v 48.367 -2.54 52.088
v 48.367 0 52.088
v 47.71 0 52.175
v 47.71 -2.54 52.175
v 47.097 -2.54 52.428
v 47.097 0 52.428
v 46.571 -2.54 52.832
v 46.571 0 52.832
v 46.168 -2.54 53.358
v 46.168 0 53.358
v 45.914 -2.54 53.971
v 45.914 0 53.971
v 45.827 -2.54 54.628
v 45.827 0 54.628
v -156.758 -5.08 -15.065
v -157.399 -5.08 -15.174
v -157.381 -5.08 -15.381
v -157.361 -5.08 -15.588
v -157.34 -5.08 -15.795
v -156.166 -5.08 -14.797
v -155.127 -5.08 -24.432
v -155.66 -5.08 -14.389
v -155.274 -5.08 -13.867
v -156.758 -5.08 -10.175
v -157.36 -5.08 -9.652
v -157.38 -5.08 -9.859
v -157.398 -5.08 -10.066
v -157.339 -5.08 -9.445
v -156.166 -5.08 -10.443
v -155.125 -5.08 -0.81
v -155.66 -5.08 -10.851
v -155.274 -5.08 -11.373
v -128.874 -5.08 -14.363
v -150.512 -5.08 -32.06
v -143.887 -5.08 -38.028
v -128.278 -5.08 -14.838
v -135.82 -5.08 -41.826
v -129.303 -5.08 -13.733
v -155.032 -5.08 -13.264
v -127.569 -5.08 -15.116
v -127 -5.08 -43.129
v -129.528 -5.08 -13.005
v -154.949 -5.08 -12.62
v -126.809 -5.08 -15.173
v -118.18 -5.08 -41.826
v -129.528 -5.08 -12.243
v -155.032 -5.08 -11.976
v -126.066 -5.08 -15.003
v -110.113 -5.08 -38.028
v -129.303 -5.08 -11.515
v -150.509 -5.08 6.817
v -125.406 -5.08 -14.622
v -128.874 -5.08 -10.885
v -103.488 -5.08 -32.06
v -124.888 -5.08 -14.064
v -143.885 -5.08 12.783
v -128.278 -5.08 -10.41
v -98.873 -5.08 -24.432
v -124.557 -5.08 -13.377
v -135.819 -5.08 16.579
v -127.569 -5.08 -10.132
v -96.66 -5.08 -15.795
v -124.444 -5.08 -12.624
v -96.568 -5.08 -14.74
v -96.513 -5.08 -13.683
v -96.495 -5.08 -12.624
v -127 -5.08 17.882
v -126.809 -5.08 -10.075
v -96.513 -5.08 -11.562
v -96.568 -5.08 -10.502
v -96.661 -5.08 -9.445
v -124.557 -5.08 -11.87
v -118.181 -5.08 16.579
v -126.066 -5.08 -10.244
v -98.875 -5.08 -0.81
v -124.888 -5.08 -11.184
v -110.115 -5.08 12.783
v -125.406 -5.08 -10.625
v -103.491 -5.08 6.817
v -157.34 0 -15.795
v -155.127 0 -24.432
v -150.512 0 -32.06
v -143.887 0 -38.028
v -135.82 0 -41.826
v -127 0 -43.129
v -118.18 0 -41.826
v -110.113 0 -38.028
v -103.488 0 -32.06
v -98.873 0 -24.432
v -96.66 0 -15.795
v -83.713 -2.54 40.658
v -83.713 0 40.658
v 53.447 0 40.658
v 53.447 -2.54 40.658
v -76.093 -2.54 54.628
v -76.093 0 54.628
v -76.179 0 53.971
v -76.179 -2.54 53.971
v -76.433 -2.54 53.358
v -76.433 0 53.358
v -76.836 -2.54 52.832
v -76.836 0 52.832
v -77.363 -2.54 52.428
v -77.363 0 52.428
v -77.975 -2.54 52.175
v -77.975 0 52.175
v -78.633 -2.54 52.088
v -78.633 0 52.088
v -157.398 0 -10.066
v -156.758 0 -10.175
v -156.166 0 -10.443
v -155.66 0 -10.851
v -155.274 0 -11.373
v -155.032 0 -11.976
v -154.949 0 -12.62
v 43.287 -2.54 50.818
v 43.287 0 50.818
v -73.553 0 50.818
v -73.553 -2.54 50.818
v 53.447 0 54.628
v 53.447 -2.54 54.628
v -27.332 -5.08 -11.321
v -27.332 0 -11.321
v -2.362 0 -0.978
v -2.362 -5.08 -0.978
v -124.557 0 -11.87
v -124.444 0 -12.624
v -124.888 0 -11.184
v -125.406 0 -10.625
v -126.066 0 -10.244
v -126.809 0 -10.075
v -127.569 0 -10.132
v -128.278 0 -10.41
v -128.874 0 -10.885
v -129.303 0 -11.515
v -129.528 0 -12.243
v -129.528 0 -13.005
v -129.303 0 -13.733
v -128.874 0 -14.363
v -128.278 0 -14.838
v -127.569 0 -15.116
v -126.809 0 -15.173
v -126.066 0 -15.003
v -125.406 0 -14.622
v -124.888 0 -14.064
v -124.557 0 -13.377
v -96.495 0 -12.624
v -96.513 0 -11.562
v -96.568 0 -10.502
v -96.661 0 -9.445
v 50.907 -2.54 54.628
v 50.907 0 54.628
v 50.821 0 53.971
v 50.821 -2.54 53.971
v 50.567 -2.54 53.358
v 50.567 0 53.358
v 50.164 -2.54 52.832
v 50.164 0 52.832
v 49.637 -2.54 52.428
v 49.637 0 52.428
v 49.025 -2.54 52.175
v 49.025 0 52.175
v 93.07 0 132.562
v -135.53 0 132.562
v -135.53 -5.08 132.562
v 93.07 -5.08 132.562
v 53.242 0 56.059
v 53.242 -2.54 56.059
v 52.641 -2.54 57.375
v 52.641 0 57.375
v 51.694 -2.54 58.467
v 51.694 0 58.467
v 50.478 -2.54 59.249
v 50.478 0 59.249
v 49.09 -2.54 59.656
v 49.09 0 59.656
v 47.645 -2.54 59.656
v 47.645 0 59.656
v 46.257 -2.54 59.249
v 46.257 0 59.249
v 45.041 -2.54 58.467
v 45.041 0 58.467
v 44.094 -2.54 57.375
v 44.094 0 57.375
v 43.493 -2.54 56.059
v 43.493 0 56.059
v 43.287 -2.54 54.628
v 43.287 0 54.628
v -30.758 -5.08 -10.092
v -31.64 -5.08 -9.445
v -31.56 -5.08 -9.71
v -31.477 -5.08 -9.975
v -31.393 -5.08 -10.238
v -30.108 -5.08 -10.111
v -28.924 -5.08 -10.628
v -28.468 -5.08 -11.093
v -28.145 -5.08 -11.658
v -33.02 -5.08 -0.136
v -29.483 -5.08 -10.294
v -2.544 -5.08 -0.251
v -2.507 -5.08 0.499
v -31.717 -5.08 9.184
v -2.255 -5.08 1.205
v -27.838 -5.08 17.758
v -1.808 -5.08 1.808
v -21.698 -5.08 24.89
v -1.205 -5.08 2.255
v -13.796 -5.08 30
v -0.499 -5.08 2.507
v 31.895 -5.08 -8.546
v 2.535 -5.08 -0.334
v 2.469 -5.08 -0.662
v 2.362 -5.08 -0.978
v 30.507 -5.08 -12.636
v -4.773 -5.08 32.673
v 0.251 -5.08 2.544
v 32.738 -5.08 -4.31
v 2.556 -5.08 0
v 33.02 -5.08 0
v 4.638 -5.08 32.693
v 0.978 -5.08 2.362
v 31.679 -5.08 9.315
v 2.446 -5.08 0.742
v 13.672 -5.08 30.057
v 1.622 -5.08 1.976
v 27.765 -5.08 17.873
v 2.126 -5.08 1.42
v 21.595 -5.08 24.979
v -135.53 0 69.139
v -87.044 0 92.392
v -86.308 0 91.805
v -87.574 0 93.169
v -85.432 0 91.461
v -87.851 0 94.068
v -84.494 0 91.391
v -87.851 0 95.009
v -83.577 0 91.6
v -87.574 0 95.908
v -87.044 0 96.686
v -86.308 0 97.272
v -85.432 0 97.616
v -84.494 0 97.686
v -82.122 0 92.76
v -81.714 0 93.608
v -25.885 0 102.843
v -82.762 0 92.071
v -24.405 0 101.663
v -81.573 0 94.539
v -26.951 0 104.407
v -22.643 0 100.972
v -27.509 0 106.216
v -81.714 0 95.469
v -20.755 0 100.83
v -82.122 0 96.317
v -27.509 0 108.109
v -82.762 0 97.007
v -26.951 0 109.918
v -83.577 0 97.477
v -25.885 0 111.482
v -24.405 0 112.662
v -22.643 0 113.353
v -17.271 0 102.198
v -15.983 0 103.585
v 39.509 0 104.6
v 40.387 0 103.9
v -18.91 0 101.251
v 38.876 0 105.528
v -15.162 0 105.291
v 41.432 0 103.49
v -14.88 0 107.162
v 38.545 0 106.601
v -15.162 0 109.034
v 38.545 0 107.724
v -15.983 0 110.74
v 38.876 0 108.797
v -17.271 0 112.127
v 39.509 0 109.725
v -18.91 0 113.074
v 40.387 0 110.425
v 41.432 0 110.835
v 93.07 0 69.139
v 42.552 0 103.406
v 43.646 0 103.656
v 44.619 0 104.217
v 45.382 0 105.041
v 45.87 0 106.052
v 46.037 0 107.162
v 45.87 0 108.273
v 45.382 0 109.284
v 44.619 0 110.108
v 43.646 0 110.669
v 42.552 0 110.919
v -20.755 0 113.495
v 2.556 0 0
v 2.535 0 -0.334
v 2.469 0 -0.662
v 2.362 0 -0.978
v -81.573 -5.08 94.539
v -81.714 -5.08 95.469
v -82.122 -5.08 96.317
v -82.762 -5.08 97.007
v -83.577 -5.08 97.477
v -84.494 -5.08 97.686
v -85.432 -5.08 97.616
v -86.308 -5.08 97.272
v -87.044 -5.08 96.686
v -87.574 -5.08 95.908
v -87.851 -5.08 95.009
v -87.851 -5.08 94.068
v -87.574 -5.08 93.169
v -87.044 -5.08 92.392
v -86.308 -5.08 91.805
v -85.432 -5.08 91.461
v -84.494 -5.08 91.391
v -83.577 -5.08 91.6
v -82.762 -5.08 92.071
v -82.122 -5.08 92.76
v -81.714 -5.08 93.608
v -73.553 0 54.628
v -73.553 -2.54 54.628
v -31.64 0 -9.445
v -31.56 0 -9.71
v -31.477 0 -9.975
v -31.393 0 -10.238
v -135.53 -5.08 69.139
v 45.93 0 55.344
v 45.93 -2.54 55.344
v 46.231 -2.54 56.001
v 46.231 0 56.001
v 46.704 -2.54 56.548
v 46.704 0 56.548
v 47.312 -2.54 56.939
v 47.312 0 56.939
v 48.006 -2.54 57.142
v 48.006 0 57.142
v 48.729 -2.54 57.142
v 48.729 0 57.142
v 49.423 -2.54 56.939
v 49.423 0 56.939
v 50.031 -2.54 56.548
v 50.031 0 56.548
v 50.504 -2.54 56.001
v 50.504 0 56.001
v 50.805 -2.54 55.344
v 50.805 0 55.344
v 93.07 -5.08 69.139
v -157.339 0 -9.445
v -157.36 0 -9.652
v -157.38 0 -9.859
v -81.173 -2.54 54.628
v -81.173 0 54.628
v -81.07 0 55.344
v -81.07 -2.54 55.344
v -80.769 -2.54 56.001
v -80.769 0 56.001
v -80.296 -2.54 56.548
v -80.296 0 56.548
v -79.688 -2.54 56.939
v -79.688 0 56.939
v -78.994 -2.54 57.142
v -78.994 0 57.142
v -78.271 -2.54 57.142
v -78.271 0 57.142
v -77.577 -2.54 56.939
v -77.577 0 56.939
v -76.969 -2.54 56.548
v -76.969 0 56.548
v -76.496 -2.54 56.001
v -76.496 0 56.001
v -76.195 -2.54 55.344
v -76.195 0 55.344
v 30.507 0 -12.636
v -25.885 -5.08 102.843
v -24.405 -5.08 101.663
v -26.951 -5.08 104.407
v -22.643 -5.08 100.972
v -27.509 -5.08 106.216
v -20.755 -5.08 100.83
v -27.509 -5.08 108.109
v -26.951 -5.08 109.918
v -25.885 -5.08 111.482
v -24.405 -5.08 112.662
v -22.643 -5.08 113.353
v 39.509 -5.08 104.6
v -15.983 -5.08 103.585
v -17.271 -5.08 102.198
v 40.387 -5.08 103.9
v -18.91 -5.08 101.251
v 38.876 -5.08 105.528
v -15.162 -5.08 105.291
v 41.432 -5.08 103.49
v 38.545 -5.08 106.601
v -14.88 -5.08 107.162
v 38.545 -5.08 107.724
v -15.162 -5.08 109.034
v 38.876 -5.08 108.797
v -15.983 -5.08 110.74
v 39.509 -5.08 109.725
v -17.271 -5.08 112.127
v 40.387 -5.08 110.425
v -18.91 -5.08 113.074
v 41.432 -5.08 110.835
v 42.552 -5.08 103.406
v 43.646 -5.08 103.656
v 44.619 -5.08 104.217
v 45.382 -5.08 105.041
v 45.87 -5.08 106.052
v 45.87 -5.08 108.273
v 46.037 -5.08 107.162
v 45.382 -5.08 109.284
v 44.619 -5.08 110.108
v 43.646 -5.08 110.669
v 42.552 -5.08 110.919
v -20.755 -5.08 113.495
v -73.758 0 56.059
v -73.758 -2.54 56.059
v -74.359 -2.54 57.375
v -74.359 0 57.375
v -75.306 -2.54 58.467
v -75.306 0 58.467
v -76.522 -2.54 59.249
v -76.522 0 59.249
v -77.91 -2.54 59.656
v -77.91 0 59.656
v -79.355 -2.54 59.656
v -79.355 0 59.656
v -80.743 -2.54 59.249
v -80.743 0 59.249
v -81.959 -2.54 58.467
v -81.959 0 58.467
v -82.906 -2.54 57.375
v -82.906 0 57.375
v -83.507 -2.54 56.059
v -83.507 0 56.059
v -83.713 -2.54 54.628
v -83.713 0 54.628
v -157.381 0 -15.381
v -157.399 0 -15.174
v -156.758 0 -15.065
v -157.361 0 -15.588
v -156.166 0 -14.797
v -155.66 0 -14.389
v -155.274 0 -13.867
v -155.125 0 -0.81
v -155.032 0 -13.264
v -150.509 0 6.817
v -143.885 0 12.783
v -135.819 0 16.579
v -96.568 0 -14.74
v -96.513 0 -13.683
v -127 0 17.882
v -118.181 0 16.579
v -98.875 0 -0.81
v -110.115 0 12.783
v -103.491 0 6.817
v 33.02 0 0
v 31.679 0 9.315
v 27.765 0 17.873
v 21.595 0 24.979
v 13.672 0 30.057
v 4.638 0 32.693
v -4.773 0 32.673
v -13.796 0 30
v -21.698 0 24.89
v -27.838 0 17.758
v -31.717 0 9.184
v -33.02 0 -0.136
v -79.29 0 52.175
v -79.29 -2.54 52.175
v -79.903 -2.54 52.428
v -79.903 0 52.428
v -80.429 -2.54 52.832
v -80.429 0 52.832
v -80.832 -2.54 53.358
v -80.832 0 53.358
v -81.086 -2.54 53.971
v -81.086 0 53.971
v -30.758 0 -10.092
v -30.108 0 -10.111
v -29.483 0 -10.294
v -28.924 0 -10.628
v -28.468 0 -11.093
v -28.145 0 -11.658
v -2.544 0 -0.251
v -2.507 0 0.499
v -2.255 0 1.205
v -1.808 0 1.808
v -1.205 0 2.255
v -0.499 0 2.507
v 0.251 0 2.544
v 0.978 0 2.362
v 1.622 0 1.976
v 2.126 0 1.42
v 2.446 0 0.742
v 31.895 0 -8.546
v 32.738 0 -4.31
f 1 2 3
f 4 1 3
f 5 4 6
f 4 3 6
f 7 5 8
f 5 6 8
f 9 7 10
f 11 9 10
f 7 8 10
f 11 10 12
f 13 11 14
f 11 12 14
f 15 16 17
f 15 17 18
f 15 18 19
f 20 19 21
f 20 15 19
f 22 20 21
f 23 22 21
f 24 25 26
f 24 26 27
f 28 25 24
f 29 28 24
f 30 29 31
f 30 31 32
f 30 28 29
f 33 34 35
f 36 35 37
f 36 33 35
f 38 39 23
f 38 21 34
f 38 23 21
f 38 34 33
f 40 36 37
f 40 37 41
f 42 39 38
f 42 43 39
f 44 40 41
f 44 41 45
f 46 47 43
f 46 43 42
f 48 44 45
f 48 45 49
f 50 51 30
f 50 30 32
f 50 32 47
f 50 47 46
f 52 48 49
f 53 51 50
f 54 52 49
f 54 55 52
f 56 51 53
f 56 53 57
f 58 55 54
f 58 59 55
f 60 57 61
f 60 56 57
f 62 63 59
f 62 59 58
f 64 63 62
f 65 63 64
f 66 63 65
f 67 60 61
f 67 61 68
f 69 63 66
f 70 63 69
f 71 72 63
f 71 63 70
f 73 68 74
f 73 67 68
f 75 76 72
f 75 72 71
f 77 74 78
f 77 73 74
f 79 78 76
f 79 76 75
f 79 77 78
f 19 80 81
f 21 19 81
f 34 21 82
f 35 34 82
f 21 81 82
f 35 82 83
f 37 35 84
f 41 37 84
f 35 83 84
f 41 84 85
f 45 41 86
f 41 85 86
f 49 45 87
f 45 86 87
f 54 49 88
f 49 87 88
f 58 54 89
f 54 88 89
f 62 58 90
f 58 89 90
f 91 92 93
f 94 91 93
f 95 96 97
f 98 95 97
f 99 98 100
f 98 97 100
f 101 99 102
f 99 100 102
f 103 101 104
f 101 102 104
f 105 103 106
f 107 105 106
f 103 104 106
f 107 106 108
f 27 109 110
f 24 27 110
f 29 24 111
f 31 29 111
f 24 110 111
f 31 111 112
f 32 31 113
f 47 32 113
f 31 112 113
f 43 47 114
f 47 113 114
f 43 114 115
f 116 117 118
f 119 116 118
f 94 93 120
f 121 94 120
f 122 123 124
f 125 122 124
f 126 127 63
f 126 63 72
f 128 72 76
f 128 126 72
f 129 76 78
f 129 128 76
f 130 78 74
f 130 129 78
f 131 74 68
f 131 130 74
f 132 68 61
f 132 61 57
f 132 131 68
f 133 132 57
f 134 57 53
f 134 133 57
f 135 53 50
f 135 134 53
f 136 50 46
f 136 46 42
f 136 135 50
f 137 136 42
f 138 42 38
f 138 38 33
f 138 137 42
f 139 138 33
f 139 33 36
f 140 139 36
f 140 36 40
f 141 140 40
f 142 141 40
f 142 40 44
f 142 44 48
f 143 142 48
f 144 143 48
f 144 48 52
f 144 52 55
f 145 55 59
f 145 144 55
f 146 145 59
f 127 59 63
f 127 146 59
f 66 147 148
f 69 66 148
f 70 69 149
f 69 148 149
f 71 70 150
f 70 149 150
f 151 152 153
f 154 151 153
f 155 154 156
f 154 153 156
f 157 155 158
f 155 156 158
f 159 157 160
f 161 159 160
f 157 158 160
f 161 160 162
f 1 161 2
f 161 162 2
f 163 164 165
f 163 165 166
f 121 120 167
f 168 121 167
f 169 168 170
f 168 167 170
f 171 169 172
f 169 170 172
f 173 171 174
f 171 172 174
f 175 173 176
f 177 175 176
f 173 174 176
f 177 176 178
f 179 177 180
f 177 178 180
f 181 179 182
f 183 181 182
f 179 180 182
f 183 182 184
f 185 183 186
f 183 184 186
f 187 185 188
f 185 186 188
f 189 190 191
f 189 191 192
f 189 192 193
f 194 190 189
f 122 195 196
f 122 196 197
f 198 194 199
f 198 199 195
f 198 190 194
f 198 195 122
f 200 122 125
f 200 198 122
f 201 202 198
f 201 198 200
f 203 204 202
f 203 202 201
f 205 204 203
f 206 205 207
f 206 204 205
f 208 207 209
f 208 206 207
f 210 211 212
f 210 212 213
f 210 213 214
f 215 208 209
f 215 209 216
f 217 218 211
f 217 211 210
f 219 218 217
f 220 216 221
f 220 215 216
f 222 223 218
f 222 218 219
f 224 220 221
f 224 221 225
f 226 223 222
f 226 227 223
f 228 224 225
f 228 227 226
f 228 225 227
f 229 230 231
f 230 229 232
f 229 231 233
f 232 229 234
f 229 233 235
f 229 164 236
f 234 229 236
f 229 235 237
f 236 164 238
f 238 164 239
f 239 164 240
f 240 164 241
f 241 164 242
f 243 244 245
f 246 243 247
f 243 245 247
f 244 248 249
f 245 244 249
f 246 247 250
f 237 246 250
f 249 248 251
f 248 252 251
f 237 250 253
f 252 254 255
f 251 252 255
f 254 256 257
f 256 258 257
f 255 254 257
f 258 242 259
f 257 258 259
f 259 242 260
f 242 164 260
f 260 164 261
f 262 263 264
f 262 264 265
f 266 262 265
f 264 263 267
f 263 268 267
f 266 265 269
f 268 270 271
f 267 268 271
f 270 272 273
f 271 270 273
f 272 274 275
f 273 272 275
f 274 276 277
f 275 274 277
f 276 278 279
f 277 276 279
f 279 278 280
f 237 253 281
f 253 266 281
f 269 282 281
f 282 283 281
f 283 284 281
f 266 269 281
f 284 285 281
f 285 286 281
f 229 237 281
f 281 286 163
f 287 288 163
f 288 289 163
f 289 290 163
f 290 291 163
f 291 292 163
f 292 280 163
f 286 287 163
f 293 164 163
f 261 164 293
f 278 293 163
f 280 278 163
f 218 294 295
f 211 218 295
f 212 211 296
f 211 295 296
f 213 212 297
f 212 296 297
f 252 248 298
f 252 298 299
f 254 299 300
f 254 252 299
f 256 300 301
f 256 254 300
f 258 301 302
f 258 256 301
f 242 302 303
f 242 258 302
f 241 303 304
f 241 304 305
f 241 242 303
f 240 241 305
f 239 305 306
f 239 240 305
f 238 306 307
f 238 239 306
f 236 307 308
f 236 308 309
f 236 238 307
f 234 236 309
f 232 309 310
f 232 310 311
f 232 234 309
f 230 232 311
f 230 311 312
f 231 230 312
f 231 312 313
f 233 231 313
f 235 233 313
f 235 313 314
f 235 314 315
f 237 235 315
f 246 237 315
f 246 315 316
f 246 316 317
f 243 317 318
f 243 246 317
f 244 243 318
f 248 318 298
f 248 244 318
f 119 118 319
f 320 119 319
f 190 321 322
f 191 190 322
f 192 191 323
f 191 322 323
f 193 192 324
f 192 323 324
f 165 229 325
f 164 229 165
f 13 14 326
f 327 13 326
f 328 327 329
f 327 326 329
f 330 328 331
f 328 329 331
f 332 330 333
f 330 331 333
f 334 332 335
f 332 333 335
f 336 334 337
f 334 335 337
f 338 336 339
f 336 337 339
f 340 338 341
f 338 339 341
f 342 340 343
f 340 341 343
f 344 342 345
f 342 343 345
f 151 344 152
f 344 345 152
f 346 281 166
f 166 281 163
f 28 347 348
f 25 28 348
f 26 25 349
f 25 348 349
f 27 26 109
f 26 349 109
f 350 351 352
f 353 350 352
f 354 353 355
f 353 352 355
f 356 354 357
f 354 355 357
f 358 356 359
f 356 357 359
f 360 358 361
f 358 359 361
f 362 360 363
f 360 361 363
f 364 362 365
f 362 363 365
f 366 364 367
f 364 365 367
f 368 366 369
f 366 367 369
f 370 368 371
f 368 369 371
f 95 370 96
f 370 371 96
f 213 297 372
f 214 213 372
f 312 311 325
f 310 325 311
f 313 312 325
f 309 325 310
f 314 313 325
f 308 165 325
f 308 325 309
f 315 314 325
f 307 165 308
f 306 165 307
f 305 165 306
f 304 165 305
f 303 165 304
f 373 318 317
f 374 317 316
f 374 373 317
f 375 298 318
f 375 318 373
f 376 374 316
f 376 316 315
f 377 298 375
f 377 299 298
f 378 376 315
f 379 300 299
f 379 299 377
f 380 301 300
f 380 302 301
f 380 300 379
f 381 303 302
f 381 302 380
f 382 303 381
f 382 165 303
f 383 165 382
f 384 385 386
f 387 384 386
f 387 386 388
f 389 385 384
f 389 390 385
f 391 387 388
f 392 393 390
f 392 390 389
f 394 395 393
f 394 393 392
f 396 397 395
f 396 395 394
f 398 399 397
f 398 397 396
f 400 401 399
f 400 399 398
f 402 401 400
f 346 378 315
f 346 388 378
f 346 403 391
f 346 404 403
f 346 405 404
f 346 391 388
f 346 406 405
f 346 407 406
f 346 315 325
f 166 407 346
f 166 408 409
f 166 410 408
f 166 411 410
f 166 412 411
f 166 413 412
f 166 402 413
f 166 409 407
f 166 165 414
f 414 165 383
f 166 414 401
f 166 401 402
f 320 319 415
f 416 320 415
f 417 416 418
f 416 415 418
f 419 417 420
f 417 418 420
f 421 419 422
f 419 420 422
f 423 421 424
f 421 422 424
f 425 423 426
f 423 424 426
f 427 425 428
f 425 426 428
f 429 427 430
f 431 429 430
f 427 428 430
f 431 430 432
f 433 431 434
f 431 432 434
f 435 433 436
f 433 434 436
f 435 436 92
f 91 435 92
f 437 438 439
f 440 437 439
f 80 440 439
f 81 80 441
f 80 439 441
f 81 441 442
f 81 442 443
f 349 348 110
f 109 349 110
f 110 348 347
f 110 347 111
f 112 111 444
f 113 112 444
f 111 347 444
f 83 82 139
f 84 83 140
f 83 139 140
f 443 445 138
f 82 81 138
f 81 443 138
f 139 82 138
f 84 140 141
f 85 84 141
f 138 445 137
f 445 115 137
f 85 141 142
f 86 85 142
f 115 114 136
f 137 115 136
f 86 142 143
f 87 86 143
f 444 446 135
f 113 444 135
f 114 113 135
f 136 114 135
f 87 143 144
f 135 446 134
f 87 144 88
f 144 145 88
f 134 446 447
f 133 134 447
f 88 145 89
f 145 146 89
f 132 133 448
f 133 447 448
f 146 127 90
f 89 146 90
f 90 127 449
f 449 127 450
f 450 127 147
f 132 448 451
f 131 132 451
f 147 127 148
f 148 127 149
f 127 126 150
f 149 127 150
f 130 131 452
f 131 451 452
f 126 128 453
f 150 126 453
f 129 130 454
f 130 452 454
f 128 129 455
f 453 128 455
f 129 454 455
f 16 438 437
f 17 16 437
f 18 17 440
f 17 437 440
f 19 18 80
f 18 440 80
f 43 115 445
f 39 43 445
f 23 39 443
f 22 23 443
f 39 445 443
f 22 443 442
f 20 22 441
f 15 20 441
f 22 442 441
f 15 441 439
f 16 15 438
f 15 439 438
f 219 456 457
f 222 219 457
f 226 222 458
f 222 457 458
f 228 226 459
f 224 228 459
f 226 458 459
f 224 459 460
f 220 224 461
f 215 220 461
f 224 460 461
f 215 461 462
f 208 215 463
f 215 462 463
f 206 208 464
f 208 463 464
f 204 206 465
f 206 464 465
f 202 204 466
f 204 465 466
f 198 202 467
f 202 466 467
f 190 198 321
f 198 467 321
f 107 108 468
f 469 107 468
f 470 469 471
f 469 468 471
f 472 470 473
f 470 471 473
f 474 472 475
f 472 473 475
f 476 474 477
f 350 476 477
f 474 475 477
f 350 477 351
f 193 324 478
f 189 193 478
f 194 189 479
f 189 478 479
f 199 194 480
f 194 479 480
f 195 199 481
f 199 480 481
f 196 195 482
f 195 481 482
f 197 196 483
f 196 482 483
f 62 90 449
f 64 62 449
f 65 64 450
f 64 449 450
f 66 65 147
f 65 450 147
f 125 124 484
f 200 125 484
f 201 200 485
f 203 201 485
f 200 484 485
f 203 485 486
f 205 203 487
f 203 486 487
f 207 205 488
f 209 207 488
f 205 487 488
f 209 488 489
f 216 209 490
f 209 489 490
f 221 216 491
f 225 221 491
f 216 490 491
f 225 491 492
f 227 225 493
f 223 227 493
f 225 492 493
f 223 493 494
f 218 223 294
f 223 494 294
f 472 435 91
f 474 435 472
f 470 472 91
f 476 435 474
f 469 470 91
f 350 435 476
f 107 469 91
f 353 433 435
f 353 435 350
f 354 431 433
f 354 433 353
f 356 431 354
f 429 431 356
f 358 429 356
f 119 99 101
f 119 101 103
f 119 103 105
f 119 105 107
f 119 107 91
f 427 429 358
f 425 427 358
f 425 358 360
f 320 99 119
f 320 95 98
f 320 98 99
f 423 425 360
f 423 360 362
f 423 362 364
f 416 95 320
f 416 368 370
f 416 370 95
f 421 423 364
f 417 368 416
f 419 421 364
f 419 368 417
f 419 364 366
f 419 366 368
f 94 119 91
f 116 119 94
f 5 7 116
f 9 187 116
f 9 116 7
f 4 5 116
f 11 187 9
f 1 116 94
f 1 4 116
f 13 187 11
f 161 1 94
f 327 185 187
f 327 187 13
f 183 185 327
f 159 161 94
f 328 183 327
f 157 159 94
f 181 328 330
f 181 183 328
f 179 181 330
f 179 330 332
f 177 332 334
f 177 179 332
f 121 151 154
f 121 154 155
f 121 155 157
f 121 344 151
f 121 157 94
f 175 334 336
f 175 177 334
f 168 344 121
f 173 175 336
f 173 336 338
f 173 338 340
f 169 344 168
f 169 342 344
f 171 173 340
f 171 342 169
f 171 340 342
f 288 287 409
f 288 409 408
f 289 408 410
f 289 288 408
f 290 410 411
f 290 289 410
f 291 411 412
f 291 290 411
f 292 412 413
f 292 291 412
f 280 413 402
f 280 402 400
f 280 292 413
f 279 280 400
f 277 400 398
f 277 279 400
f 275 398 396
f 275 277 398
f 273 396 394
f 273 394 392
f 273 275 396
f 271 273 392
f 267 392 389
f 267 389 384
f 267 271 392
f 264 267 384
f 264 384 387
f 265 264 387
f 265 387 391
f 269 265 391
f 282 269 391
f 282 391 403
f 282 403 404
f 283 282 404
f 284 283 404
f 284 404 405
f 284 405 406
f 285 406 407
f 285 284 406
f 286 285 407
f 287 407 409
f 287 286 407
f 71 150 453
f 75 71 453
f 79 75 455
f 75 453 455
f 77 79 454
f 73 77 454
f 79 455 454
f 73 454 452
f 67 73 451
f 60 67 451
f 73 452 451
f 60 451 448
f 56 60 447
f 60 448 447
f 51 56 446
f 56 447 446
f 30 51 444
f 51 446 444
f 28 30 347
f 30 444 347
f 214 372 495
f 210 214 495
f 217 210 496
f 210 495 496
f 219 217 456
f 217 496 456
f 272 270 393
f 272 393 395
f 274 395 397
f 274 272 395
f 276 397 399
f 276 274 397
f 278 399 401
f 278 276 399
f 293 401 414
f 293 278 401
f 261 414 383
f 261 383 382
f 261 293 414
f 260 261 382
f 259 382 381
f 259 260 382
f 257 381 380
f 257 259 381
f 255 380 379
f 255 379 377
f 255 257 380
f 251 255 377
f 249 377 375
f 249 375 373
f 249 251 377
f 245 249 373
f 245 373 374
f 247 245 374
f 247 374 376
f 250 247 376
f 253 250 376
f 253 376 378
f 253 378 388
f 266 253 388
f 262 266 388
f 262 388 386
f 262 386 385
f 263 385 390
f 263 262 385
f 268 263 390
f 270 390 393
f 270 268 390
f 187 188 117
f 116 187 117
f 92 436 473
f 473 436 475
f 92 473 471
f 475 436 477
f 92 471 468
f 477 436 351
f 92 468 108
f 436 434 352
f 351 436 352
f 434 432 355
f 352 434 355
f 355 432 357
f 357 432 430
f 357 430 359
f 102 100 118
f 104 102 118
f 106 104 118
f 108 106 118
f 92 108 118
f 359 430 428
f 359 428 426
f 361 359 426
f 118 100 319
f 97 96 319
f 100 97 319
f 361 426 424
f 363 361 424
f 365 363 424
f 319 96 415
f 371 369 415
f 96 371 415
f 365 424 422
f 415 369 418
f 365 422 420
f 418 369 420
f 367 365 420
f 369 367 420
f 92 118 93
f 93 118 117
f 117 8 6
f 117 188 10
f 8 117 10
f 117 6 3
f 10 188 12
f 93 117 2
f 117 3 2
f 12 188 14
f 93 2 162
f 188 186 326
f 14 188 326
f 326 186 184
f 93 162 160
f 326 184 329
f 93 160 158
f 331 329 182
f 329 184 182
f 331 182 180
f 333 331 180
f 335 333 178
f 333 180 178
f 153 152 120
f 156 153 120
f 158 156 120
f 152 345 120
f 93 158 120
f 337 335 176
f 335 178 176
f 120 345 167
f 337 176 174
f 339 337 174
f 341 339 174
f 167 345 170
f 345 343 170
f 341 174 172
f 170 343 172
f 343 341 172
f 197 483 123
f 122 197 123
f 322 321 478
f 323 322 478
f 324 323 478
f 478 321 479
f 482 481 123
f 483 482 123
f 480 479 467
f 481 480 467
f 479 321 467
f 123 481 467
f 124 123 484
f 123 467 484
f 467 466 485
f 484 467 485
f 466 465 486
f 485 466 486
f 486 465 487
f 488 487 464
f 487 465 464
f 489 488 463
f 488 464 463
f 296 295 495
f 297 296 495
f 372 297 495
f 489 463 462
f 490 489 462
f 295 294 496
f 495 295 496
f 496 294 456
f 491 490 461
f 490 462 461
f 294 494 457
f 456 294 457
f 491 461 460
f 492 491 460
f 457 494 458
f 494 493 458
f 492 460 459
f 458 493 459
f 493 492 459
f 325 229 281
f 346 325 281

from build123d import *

# Parameters (mm, degrees)
F0_R     = 2.556390942
F1_DEPTH = 5.08
F2_DEPTH = 5.08
F4_DEPTH = 2.54
F5_W     = 228.6
F5_H     = 63.4238
F5_R     = 3.156654388
F5_R_2   = 6.35
F5_R_3   = 3.7668748596
F6_DEPTH = 5.08


with BuildPart() as f1:
    # F0 (on Front) → F1 (new body)
    with BuildSketch(Plane.XZ):
        with BuildLine():
            Line((-157.3393124845, -9.4448776781), (-96.6606875155, -9.4448776781))
            ThreePointArc((-96.6606875155, -9.4448776781), (-127, 17.8816), (-157.3393124845, -9.4448776781))
        make_face()
        with BuildLine():
            ThreePointArc((-157.340133413, -15.7948776781), (-127, -43.1292), (-96.659866587, -15.7948776781))
            Line((-96.659866587, -15.7948776781), (-157.340133413, -15.7948776781))
        make_face()
        with BuildLine():
            ThreePointArc((-96.4946, -12.6238), (-96.5361501758, -11.0321709452), (-96.6606875155, -9.4448776781))
            Line((-96.6606875155, -9.4448776781), (-157.3393124845, -9.4448776781))
            ThreePointArc((-157.3393124845, -9.4448776781), (-157.370221334, -9.7551617721), (-157.3979569515, -10.0657455958))
            ThreePointArc((-157.3979569515, -10.0657455958), (-155.6601625762, -10.8506308246), (-154.9490088059, -12.6198776781))
            ThreePointArc((-154.9490088059, -12.6198776781), (-155.6603900775, -14.3893617737), (-157.3986137652, -15.1740373054))
            ThreePointArc((-157.3986137652, -15.1740373054), (-157.3709600258, -15.4846069269), (-157.340133413, -15.7948776781))
            Line((-157.340133413, -15.7948776781), (-96.659866587, -15.7948776781))
            ThreePointArc((-96.659866587, -15.7948776781), (-96.5359446644, -14.2114906724), (-96.4946, -12.6238))
        make_face()
        with Locations((-127, -12.6238)):
            Circle(F0_R, mode=Mode.SUBTRACT)
    extrude(amount=F1_DEPTH)


with BuildPart() as f2:
    # F0 (on Front) → F2 (new body)
    with BuildSketch(Plane.XZ):
        with BuildLine():
            ThreePointArc((30.5065021635, -12.6362069367), (32.3855299589, -6.441882433), (33.02, 0))
            ThreePointArc((33.02, 0), (-4.7725522624, 32.6732787596), (-31.6403964205, -9.4448776781))
            Line((-31.6403964205, -9.4448776781), (-27.3315021635, -9.4448776781))
            Line((-27.3315021635, -9.4448776781), (-27.3315021635, -11.3210788762))
            Line((-27.3315021635, -11.3210788762), (-2.3617972684, -0.9782884601))
            ThreePointArc((-2.3617972684, -0.9782884601), (-0.4987271321, 2.5072706068), (2.556390942, 0))
            ThreePointArc((2.556390942, 0), (2.5072706068, -0.4987271321), (2.3617972684, -0.9782884601))
            Line((2.3617972684, -0.9782884601), (30.5065021635, -12.6362069367))
        make_face()
        with BuildLine():
            Line((-27.3315021635, -9.4448776781), (-31.6403964205, -9.4448776781))
            ThreePointArc((-31.6403964205, -9.4448776781), (-31.5190113829, -9.8423737707), (-31.3926328459, -10.238310554))
            ThreePointArc((-31.3926328459, -10.238310554), (-29.4826761863, -10.2937904459), (-28.1447048951, -11.6579184766))
            Line((-28.1447048951, -11.6579184766), (-27.3315021635, -11.3210788762))
            Line((-27.3315021635, -11.3210788762), (-27.3315021635, -9.4448776781))
        make_face()
    extrude(amount=F2_DEPTH)


with BuildPart() as f4:
    # F3 (on Front) → F4 (new body)
    with BuildSketch(Plane.XZ):
        with BuildLine():
            Line((-73.5525222105, 54.6281948608), (-76.0925222105, 54.6281948608))
            ThreePointArc((-76.0925222105, 54.6281948608), (-76.8364709863, 52.8321436366), (-78.6325222105, 52.0881948608))
            ThreePointArc((-78.6325222105, 52.0881948608), (-80.4285734347, 52.8321436366), (-81.1725222105, 54.6281948608))
            Line((-81.1725222105, 54.6281948608), (-83.7125222105, 54.6281948608))
            ThreePointArc((-83.7125222105, 54.6281948608), (-78.6325222105, 49.5481948608), (-73.5525222105, 54.6281948608))
        make_face()
        with BuildLine():
            Line((-73.5525222105, 50.8181948608), (-73.5525222105, 54.6281948608))
            ThreePointArc((-73.5525222105, 54.6281948608), (-78.6325222105, 49.5481948608), (-83.7125222105, 54.6281948608))
            Line((-83.7125222105, 54.6281948608), (-83.7125222105, 40.6581948608))
            Line((-83.7125222105, 40.6581948608), (53.4474777895, 40.6581948608))
            Line((53.4474777895, 40.6581948608), (53.4474777895, 54.6281948608))
            ThreePointArc((53.4474777895, 54.6281948608), (48.3674777895, 49.5481948608), (43.2874777895, 54.6281948608))
            Line((43.2874777895, 54.6281948608), (43.2874777895, 50.8181948608))
            Line((43.2874777895, 50.8181948608), (-73.5525222105, 50.8181948608))
        make_face()
        with BuildLine():
            Line((45.8274777895, 54.6281948608), (43.2874777895, 54.6281948608))
            ThreePointArc((43.2874777895, 54.6281948608), (48.3674777895, 49.5481948608), (53.4474777895, 54.6281948608))
            Line((53.4474777895, 54.6281948608), (50.9074777895, 54.6281948608))
            ThreePointArc((50.9074777895, 54.6281948608), (50.1635290137, 52.8321436366), (48.3674777895, 52.0881948608))
            ThreePointArc((48.3674777895, 52.0881948608), (46.5714265653, 52.8321436366), (45.8274777895, 54.6281948608))
        make_face()
        with BuildLine():
            ThreePointArc((-81.1725222105, 54.6281948608), (-78.6325222105, 57.1681948608), (-76.0925222105, 54.6281948608))
            Line((-76.0925222105, 54.6281948608), (-73.5525222105, 54.6281948608))
            ThreePointArc((-73.5525222105, 54.6281948608), (-78.6325222105, 59.7081948608), (-83.7125222105, 54.6281948608))
            Line((-83.7125222105, 54.6281948608), (-81.1725222105, 54.6281948608))
        make_face()
        with BuildLine():
            ThreePointArc((53.4474777895, 54.6281948608), (48.3674777895, 59.7081948608), (43.2874777895, 54.6281948608))
            Line((43.2874777895, 54.6281948608), (45.8274777895, 54.6281948608))
            ThreePointArc((45.8274777895, 54.6281948608), (48.3674777895, 57.1681948608), (50.9074777895, 54.6281948608))
            Line((50.9074777895, 54.6281948608), (53.4474777895, 54.6281948608))
        make_face()
    extrude(amount=F4_DEPTH)


with BuildPart() as f6:
    # F5 (on Front) → F6 (new body)
    with BuildSketch(Plane.XZ):
        with Locations((-21.22993536, 100.850559667)):
            Rectangle(F5_W, F5_H)
        with Locations((-84.72993536, 94.538659667)):
            Circle(F5_R, mode=Mode.SUBTRACT)
        with Locations((-21.22993536, 107.162459667)):
            Circle(F5_R_2, mode=Mode.SUBTRACT)
        with Locations((42.27006464, 107.162459667)):
            Circle(F5_R_3, mode=Mode.SUBTRACT)
    extrude(amount=F6_DEPTH)


solid = Compound([f1.part, f2.part, f4.part, f6.part])
